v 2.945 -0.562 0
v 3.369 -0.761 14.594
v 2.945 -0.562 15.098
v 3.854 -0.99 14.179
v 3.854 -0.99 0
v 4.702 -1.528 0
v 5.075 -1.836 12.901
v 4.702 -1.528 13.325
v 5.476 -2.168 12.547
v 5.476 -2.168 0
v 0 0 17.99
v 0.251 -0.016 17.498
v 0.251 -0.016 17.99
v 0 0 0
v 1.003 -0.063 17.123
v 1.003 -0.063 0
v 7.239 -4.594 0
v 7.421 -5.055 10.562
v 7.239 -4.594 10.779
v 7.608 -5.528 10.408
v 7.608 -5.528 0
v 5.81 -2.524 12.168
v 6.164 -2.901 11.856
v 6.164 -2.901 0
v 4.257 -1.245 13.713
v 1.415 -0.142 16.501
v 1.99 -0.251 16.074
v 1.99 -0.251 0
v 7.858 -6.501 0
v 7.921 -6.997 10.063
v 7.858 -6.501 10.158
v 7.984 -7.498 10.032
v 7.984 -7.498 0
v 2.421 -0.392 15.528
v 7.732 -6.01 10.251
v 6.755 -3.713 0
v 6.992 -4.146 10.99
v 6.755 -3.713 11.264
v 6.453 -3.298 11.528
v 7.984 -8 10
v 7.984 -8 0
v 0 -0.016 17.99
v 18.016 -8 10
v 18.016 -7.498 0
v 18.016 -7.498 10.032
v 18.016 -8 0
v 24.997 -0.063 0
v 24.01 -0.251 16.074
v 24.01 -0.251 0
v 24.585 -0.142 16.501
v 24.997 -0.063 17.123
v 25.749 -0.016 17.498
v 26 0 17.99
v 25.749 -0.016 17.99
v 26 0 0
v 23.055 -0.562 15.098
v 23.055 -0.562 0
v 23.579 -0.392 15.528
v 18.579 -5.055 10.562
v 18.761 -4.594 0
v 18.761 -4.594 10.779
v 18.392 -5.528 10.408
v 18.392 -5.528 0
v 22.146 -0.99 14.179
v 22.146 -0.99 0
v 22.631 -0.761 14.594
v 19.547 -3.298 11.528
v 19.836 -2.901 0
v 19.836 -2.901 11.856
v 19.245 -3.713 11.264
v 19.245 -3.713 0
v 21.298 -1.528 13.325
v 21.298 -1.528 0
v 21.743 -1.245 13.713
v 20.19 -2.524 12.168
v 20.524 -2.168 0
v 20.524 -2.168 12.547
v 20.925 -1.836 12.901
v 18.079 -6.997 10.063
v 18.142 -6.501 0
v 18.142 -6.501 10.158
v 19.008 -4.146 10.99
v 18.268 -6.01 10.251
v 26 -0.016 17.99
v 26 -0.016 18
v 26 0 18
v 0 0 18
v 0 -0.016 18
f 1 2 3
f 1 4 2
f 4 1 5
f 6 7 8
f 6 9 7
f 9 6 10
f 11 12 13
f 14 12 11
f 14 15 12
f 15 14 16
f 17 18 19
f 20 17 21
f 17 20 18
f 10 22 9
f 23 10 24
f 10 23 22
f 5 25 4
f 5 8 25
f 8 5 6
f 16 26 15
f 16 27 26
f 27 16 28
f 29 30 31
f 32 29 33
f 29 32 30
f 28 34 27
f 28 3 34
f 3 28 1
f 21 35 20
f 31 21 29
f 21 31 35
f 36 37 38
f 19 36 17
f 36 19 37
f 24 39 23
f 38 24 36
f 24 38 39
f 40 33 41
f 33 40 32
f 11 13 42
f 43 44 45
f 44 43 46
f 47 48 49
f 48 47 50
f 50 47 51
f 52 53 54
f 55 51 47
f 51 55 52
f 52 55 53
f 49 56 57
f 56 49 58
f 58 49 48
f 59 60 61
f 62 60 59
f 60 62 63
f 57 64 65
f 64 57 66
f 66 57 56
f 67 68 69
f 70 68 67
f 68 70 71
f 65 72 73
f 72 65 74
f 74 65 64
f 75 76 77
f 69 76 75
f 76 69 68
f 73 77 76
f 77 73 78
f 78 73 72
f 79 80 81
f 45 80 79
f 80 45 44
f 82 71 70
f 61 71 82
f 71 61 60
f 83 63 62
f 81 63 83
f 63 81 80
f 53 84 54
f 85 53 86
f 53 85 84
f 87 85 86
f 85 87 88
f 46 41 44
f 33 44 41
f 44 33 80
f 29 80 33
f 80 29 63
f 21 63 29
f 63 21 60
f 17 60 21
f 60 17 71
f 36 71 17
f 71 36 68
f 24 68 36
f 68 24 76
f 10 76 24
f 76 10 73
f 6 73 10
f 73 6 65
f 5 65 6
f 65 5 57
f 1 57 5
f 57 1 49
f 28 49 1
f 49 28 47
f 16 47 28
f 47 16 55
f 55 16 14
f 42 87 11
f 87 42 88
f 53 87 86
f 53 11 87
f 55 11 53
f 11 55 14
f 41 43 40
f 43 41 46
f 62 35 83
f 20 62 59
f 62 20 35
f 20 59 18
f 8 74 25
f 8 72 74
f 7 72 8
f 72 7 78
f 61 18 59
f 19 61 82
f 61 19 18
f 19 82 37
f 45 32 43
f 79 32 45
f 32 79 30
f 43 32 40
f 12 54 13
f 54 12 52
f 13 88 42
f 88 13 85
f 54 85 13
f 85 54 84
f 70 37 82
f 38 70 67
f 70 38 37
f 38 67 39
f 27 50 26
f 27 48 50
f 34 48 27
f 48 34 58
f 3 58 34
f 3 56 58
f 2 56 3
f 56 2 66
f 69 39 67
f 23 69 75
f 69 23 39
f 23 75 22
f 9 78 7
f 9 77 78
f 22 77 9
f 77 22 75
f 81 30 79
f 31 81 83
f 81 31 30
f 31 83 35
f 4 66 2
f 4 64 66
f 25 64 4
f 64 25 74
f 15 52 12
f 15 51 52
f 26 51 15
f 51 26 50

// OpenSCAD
// 2016Au12, v0.0.1, ls (http://www.thingiverse.com/Bushmills)
//                    initial version
//    
// creates a parametrised filled 90° T-joint. Those provide better
// resistance against breaking off the jointed leg than a square edge-on connect.   
// example:
// joint(20, 10, 8);
//    produces a T-joint piece 20mm wide, 10mm deep, with joint radius of 8mm.
//    no leg or bar to join are generated. Only the minimum volume filled
//    by the joint is the result.
//    As backs of joints are flat, they are easily printable.

// ***********************************************************
// ************ thingiverse customiser section ***************
//            (remove section when adding file to library)

width=10;    // [4:40]

depth=10;    // [4:40]

radius=8;    // [1:20]

$fn=50;      // [8:90]

joint(width, depth, radius);

// ***********************************************************

module joint(Breite, Tiefe, Radius)  {
	translate([0, -Radius, 0])
	difference()  {
		cube([Radius*2+Breite, Radius, Radius+Tiefe]);

		for (x=[0, Radius*2+Breite]) {		// left and right
			translate([x, 0, -0.01])
			rotate([0, 0,  90])
			cylinder(Radius+Tiefe, Radius, Radius);
		}

		translate([0, 0, Tiefe+Radius])		// front
		rotate([0, 90, 0])
		cylinder(Radius*2+Breite, Radius, Radius);
	}
}
